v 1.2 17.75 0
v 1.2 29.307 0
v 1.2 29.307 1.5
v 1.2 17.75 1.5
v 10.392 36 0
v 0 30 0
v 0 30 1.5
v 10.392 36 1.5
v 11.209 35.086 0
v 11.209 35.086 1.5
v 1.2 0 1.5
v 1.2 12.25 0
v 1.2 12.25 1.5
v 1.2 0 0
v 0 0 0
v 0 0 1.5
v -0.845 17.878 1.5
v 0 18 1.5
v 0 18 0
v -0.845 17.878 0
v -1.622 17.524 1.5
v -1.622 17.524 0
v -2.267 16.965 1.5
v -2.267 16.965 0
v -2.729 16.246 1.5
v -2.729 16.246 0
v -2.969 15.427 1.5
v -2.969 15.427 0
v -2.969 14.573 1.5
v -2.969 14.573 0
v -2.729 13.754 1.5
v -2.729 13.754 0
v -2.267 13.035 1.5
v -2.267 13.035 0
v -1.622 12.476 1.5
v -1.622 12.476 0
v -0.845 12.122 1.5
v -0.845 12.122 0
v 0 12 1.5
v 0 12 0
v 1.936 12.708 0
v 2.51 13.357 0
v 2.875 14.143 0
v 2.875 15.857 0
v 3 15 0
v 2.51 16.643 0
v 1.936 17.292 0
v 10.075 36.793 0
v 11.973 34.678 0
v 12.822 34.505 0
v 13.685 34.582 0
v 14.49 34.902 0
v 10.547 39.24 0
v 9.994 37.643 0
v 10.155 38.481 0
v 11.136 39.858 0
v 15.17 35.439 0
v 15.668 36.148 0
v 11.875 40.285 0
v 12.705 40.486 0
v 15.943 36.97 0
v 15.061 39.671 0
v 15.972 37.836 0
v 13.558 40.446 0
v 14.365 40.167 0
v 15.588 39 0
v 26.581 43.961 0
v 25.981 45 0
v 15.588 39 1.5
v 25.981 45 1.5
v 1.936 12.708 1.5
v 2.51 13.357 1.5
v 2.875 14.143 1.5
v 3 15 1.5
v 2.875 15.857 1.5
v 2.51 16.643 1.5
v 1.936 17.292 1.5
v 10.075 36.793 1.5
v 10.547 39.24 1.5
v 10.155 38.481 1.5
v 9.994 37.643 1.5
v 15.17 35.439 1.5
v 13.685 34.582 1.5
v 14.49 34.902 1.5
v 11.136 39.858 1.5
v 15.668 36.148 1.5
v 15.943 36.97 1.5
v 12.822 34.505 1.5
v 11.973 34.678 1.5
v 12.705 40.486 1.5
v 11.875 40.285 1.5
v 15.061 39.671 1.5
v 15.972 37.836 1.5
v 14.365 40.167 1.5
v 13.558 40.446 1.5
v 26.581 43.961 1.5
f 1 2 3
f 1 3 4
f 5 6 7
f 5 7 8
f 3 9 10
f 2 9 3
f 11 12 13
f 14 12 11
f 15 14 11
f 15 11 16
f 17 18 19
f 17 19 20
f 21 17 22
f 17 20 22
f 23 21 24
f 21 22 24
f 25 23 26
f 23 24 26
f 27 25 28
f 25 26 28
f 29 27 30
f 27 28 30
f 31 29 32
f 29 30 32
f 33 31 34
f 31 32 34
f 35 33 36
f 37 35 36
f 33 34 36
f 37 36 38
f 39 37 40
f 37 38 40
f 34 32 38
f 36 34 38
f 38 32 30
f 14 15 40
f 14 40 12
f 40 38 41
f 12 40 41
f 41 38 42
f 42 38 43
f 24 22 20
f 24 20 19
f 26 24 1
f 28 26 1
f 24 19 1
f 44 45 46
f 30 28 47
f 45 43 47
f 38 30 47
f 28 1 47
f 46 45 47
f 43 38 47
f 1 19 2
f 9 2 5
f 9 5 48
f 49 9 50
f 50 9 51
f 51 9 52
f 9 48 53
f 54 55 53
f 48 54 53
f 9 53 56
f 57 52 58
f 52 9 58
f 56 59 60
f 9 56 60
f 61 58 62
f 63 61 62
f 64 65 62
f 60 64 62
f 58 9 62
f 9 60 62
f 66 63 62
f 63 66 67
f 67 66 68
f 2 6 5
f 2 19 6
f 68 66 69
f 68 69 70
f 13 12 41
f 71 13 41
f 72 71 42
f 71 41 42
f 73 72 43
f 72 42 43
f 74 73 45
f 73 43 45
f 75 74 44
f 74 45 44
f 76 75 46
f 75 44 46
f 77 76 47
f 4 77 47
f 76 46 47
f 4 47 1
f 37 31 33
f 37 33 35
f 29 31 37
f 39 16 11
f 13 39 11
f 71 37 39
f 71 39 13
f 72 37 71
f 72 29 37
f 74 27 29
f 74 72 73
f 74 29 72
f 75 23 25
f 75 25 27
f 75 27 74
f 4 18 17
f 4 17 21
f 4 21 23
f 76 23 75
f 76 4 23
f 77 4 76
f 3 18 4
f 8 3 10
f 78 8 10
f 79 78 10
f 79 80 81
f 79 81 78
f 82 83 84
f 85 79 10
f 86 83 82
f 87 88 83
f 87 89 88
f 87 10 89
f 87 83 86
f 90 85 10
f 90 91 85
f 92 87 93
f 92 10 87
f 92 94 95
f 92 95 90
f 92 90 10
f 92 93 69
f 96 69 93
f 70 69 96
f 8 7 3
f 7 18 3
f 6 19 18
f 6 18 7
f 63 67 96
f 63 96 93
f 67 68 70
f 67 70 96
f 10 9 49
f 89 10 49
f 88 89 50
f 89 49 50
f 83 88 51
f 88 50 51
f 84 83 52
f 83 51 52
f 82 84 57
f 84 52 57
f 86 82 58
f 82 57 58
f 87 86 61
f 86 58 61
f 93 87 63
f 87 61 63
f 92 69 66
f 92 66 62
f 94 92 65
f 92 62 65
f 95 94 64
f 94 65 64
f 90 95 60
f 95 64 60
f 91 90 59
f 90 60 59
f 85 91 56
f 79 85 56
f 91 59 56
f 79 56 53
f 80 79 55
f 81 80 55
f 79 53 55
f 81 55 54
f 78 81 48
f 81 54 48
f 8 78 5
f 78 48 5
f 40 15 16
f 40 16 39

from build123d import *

# Parameters (mm, degrees)
EXTRUDE_THIN1_DEPTH = 1.5
SKETCH2_R           = 3
BOSS_EXTRUDE1_DEPTH = 1.5


with BuildPart() as part:
    # Sketch1 → Extrude-Thin1 (new body)
    with BuildSketch(Plane.XY):
        Polygon((0, 0), (0, 30), (25.980762114, 45), (26.580762114, 43.960769515), (1.2, 29.307179677), (1.2, 0), align=None)
    extrude(amount=EXTRUDE_THIN1_DEPTH)

    # Sketch2 → Boss-Extrude1 (add)
    with BuildSketch(Plane.XY):
        with Locations((12.990381057, 37.5)):
            Circle(SKETCH2_R)
        with Locations((0, 15)):
            Circle(SKETCH2_R)
    extrude(amount=BOSS_EXTRUDE1_DEPTH)


solid = part.part
